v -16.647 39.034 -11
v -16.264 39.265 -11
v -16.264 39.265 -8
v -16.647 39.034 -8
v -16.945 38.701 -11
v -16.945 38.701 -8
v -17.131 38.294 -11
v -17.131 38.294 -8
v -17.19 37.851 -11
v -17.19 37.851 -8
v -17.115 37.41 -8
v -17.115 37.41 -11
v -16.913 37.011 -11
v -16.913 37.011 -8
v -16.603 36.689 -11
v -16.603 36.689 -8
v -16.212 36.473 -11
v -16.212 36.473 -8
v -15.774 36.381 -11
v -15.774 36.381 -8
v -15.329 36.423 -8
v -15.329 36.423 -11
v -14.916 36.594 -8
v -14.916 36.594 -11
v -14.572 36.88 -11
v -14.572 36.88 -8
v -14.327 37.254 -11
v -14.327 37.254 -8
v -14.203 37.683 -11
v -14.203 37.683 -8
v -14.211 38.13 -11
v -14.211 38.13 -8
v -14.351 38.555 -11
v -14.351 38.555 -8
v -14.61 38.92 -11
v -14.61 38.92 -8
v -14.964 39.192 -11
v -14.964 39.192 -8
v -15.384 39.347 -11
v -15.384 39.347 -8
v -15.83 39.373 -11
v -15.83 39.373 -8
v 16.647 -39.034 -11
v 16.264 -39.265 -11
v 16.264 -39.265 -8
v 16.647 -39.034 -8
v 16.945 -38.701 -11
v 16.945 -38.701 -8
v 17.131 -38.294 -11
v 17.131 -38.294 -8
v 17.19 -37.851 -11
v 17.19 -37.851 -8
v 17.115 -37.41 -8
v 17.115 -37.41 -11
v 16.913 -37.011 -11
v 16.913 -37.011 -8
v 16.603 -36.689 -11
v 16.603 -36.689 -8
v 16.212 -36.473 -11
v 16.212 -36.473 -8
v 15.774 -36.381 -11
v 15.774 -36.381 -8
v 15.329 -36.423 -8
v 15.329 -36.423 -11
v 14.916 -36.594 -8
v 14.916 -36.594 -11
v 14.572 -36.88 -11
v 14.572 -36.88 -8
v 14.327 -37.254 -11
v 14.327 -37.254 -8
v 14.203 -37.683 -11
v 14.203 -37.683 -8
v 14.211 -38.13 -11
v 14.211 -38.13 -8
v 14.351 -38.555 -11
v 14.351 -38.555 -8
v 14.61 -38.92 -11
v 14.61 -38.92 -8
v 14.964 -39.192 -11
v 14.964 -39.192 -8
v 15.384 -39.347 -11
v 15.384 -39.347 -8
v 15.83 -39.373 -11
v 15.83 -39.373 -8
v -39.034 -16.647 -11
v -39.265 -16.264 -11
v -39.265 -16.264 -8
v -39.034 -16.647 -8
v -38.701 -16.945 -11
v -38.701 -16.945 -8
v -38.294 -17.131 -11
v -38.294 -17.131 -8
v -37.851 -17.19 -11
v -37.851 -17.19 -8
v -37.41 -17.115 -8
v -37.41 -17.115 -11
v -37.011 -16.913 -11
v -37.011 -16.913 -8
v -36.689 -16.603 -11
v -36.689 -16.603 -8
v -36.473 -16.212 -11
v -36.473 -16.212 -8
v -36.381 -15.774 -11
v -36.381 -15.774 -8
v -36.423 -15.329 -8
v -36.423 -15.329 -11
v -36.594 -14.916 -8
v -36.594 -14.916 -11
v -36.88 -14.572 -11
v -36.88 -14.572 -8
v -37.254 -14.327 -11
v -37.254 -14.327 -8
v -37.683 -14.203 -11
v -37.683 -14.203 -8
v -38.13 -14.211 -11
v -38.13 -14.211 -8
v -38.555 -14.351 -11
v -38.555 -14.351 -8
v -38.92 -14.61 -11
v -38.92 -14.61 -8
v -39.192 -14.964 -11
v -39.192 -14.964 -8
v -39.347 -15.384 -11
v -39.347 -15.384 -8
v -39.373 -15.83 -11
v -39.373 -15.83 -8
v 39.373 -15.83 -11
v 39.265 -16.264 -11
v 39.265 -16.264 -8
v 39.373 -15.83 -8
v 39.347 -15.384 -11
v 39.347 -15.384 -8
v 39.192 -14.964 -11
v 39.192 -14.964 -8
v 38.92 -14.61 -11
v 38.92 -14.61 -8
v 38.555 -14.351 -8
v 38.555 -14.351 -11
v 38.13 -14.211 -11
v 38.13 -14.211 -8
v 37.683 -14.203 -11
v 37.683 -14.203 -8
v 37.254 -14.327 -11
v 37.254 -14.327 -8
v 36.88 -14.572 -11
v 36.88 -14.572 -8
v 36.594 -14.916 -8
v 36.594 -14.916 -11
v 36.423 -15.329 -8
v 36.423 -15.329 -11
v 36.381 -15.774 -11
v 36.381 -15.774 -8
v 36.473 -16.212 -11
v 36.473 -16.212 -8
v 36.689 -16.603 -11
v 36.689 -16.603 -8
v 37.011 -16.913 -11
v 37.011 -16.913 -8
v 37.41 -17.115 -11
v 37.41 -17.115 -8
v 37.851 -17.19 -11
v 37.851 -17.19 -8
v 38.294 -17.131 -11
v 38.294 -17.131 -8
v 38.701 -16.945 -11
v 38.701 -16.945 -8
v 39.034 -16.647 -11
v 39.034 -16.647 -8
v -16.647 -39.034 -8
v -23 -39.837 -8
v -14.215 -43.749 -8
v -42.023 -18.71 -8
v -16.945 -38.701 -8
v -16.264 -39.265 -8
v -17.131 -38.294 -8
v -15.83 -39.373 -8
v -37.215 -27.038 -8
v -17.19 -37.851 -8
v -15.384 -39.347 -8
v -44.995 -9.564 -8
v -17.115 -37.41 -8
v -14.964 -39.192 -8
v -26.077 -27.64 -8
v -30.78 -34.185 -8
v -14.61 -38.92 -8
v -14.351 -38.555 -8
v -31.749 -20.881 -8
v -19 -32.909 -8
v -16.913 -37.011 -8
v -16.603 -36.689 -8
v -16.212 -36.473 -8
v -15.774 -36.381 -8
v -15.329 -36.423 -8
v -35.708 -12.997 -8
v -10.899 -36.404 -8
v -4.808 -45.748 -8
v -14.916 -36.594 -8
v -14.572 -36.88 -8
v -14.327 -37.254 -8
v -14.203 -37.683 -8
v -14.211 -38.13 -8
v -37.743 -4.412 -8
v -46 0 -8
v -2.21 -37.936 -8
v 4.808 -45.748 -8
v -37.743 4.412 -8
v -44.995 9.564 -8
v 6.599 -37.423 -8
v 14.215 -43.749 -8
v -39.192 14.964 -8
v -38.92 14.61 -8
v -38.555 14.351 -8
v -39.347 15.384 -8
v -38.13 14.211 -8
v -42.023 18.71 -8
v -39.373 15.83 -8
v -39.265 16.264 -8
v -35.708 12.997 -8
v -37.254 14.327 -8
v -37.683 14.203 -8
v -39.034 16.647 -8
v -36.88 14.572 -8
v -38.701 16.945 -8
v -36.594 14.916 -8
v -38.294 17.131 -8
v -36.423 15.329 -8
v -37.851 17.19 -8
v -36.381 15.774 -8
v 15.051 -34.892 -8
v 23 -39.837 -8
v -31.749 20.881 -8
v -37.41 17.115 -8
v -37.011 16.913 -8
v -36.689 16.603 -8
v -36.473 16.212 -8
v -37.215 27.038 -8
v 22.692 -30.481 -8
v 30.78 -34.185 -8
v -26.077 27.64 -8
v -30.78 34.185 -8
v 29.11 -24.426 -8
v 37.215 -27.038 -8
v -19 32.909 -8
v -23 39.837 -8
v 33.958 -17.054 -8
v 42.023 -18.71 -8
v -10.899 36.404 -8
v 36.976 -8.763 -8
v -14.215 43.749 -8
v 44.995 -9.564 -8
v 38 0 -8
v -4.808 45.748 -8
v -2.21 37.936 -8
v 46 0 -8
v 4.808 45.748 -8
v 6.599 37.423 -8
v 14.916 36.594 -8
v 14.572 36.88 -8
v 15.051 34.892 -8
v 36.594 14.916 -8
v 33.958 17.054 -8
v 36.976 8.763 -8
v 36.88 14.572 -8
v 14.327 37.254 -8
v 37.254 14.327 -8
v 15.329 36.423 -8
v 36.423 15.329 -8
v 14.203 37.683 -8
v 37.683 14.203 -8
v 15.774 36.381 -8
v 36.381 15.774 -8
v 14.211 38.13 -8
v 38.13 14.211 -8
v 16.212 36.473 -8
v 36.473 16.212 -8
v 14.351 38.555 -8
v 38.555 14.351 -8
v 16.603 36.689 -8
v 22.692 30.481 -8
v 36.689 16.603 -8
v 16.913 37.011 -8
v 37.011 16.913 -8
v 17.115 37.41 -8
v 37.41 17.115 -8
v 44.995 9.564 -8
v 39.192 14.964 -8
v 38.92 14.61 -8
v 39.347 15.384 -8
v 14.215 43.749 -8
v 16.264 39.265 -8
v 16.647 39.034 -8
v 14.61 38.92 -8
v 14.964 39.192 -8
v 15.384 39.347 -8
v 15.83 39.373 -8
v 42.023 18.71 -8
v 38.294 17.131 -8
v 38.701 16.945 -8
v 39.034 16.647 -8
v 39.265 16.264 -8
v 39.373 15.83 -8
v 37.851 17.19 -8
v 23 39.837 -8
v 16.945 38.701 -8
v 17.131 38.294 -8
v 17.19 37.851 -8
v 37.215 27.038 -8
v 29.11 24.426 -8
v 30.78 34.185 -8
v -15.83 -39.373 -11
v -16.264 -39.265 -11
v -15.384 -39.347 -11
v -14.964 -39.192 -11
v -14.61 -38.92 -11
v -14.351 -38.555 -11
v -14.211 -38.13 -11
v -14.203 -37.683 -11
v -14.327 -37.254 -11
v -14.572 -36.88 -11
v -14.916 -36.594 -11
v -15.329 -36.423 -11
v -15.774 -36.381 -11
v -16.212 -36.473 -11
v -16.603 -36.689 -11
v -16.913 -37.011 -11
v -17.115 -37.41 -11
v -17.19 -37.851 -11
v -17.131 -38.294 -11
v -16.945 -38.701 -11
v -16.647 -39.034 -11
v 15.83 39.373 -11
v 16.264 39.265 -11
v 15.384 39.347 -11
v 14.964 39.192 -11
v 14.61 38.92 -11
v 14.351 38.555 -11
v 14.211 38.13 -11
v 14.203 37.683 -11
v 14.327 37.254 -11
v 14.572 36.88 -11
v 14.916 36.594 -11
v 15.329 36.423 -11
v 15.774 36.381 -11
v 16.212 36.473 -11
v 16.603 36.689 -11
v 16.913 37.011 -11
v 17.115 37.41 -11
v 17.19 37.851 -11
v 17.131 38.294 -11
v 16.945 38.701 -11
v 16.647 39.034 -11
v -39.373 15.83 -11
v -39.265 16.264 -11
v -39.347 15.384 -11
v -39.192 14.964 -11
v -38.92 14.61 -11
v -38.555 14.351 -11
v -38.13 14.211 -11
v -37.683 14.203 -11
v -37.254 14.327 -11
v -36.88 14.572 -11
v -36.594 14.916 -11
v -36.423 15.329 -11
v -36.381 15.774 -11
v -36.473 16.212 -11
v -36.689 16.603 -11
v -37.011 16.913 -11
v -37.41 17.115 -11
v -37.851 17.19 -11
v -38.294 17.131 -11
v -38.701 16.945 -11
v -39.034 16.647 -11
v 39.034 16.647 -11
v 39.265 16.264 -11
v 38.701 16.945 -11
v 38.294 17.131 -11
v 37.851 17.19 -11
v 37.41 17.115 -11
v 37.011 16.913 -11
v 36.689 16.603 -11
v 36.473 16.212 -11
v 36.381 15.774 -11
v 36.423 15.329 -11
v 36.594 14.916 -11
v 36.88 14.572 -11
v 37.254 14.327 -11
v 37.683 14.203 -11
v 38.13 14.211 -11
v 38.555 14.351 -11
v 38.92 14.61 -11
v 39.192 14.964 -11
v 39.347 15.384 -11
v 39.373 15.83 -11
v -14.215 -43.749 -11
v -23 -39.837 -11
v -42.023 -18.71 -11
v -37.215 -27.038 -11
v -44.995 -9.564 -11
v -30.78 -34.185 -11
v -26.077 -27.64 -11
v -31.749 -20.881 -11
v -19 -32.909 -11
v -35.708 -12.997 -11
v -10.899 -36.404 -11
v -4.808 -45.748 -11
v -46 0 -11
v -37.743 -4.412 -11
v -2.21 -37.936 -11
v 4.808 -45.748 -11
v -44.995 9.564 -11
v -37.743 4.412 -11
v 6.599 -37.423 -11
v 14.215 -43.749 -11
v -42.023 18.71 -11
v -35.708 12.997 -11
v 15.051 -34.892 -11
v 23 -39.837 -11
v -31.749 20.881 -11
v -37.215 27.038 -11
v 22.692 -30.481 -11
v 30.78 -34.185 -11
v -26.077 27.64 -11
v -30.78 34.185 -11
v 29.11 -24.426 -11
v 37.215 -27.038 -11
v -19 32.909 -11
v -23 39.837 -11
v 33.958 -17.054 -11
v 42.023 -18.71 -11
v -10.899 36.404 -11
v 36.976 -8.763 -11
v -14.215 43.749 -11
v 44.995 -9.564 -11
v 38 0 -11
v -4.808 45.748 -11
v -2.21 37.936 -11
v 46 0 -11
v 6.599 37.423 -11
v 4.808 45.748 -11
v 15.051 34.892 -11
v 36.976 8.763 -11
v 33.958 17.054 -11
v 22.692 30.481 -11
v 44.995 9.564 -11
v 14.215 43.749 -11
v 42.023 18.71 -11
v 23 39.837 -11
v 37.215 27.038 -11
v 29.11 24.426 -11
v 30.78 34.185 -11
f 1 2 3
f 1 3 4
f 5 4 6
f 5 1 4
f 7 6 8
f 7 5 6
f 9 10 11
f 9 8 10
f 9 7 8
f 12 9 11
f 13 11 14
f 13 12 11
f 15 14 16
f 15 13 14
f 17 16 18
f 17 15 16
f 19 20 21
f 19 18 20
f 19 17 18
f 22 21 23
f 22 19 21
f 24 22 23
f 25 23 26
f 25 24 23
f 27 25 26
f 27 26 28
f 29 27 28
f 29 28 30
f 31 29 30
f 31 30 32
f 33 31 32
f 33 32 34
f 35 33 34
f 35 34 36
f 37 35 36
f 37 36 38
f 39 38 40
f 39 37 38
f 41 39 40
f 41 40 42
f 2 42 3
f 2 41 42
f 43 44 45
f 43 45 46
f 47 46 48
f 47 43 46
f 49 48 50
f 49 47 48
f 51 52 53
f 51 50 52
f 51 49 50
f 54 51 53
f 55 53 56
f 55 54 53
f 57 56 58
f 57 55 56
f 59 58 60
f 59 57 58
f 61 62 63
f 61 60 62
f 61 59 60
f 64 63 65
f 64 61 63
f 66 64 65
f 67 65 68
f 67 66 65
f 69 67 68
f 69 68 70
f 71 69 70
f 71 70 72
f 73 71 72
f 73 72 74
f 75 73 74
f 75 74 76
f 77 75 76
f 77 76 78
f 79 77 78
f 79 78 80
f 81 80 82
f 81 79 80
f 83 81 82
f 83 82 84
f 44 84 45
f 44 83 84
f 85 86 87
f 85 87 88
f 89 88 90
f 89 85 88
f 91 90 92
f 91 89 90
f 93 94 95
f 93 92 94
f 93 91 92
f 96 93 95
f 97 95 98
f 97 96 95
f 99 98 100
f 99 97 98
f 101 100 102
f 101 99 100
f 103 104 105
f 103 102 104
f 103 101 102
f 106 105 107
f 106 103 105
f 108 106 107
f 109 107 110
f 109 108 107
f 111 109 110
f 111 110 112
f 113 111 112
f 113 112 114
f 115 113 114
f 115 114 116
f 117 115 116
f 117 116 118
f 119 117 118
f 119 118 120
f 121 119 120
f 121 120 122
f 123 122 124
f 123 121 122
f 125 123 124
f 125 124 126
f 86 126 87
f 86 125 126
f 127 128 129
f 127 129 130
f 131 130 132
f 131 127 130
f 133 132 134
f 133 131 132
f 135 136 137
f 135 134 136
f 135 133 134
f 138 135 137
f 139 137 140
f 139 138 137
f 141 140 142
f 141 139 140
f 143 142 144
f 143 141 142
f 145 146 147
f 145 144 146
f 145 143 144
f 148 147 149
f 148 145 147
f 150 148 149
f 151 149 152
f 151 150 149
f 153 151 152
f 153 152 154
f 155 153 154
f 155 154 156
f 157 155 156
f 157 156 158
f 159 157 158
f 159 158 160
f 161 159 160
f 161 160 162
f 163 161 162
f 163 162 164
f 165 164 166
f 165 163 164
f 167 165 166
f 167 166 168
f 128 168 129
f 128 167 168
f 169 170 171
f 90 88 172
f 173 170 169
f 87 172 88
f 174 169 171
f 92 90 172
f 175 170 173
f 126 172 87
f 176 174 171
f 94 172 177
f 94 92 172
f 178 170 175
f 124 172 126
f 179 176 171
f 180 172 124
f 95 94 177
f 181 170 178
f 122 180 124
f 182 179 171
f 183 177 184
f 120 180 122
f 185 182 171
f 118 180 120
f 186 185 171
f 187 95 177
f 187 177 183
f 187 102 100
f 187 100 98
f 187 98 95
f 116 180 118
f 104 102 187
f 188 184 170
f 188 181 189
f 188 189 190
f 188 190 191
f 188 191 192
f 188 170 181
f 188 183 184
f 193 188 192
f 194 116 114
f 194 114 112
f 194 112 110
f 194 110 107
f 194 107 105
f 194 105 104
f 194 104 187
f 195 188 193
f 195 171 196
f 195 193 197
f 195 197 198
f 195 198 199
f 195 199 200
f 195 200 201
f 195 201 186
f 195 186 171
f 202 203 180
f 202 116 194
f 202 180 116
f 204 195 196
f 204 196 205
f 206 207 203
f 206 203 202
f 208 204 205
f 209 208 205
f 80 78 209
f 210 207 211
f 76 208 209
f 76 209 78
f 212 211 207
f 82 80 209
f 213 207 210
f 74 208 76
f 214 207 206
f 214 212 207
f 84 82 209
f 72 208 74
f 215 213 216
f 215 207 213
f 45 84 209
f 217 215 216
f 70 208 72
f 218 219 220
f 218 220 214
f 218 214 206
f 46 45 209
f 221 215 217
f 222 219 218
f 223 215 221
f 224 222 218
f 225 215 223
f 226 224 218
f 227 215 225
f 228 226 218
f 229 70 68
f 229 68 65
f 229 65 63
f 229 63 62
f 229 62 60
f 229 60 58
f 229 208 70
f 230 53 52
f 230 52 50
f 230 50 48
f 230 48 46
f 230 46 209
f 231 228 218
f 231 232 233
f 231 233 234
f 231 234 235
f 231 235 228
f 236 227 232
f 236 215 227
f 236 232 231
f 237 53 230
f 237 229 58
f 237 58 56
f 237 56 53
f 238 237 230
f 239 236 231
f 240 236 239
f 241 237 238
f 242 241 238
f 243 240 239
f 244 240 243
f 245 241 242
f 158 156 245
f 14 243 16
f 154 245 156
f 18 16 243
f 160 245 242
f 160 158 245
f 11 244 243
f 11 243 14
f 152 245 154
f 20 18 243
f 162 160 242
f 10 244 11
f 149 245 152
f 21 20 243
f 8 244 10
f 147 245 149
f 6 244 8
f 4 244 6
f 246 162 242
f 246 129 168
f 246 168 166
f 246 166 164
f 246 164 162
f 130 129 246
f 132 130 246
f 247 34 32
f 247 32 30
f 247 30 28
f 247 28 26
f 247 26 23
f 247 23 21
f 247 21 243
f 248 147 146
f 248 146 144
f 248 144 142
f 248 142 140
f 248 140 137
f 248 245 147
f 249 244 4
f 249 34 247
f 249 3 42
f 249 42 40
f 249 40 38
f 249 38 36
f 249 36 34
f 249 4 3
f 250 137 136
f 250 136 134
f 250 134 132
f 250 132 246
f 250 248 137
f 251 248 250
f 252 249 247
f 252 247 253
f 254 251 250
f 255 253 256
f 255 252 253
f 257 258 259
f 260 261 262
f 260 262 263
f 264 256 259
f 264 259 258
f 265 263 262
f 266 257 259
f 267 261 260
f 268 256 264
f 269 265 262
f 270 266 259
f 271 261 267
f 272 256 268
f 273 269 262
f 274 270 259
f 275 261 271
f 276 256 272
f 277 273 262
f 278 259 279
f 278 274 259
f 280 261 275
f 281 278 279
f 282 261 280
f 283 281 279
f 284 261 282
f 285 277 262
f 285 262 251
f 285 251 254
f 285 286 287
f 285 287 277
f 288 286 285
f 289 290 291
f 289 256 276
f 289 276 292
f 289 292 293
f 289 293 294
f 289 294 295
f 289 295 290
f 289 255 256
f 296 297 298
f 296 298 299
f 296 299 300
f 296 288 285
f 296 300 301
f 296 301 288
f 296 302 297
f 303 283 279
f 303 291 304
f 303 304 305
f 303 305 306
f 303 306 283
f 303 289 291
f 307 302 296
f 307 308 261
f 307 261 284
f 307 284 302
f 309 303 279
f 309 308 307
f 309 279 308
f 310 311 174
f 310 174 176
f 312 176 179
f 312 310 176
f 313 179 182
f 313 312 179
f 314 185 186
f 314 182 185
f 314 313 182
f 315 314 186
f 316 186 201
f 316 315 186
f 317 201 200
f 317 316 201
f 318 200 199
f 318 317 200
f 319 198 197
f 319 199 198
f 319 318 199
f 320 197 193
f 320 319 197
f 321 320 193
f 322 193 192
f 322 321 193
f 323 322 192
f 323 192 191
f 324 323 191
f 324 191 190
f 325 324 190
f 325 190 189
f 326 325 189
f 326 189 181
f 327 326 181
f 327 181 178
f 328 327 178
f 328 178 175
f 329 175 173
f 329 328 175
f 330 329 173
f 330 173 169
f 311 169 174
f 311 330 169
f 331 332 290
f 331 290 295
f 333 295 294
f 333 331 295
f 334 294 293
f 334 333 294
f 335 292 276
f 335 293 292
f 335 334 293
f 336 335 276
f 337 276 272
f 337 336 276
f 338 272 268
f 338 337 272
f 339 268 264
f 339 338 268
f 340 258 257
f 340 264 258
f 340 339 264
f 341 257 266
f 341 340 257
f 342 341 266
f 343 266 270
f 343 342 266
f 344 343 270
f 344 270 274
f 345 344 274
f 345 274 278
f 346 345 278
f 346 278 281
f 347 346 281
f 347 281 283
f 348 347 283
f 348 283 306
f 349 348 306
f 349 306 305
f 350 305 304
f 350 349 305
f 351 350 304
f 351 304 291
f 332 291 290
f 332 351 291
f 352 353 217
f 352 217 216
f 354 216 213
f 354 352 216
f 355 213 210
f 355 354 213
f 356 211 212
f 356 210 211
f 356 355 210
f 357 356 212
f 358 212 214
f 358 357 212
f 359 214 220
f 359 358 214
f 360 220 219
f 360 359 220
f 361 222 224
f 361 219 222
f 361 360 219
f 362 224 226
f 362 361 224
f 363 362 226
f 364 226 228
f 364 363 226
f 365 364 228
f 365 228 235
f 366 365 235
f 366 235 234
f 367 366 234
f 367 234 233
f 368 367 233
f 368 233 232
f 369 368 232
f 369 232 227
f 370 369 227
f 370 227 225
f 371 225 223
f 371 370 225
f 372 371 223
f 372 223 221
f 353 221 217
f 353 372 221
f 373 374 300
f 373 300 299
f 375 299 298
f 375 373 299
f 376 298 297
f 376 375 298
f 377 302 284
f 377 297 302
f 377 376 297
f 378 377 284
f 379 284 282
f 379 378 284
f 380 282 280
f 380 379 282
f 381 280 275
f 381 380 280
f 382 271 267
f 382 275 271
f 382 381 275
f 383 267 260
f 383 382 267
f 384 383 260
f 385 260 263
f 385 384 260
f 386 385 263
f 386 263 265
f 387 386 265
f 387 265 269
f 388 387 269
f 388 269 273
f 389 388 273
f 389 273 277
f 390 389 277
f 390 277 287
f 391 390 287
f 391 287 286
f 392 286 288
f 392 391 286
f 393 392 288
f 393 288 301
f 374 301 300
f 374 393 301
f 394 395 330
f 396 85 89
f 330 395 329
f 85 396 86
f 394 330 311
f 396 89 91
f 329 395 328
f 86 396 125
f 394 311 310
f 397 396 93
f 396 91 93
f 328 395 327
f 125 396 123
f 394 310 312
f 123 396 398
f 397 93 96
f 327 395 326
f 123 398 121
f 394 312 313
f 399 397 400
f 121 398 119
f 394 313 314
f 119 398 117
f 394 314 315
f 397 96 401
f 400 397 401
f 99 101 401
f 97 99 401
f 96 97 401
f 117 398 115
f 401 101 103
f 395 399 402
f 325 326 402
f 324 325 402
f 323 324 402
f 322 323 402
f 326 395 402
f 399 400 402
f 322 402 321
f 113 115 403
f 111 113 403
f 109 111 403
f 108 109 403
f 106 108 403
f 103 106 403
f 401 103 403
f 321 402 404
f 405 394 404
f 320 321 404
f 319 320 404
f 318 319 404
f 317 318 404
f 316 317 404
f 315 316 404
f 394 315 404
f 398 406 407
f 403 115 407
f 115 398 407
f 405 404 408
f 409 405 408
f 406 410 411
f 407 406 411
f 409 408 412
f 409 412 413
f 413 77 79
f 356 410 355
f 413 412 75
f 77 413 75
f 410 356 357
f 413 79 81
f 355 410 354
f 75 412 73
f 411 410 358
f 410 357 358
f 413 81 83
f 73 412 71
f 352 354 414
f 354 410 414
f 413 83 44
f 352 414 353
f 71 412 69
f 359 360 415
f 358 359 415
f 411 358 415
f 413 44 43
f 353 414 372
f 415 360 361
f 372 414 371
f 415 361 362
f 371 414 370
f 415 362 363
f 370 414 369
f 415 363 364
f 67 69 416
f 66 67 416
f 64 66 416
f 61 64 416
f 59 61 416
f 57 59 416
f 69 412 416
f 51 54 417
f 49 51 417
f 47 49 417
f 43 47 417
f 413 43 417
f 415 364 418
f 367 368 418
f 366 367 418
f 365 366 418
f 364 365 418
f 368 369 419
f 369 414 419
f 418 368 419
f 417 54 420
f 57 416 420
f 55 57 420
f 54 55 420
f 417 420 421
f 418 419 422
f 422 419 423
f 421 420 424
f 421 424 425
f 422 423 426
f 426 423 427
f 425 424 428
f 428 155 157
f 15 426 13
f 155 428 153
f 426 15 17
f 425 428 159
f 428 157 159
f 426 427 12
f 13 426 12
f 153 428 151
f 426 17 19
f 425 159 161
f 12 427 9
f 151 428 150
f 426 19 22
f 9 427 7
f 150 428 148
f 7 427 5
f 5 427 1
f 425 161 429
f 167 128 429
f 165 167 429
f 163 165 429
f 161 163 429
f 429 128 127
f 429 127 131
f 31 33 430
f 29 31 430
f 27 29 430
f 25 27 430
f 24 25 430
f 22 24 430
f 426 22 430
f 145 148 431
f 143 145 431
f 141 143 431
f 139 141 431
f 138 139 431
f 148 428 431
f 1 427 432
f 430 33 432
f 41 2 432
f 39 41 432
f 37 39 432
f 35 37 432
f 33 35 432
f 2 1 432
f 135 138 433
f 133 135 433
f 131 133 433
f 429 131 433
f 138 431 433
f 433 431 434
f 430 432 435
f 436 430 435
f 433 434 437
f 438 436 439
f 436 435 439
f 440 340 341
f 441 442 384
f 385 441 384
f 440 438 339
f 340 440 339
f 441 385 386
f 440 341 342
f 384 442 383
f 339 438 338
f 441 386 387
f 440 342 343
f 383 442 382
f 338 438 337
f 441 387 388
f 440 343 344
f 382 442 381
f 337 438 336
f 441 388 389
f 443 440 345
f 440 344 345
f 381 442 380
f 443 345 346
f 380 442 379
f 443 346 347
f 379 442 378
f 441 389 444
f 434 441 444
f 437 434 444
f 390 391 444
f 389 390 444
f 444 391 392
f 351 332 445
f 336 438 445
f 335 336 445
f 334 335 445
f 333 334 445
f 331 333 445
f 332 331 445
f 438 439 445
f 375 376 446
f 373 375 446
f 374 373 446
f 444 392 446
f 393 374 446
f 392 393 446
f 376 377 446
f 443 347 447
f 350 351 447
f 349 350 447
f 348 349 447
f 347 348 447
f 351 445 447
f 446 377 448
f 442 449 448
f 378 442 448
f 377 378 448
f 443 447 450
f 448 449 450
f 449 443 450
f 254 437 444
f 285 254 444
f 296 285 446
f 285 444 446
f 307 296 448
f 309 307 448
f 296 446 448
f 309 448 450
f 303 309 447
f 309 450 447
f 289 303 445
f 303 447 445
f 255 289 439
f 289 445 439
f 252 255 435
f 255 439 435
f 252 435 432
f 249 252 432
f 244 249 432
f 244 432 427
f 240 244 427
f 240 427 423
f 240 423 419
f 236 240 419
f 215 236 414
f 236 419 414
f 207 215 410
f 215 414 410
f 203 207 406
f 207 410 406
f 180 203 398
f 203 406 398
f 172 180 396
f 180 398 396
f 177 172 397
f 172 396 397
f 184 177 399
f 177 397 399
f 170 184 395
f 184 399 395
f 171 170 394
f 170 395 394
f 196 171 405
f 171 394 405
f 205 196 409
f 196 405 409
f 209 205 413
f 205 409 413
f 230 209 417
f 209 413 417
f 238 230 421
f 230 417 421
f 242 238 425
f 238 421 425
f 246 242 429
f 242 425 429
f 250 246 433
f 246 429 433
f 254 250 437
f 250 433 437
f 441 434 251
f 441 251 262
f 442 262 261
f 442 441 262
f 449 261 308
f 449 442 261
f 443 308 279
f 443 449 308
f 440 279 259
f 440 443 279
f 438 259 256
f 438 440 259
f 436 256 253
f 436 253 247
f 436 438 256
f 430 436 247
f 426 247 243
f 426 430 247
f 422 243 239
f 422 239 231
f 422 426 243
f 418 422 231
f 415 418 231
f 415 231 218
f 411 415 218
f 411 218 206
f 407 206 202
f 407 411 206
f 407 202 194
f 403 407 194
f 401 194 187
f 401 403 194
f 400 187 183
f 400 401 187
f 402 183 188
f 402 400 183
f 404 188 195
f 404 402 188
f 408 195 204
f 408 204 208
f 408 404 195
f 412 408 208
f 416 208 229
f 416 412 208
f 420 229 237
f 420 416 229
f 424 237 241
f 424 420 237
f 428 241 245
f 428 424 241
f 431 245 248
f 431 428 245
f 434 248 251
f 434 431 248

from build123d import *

# Parameters (mm, degrees)
CYLINDER412_R               = 1.5
CYLINDER412_DEPTH           = 60
CYLINDER410_R               = 1.5
CYLINDER410_DEPTH           = 60
CYLINDER410_PLACEMENT_ANGLE = 135
CYLINDER408_R               = 1.5
CYLINDER408_DEPTH           = 60
CYLINDER411_R               = 1.5
CYLINDER411_DEPTH           = 60
CYLINDER411_PLACEMENT_ANGLE = 225
CYLINDER414_R               = 1.5
CYLINDER414_DEPTH           = 60
CYLINDER407_R               = 1.5
CYLINDER407_DEPTH           = 60
CYLINDER407_PLACEMENT_ANGLE = 45
CYLINDER413_R               = 1.5
CYLINDER413_DEPTH           = 60
CYLINDER409_R               = 1.5
CYLINDER409_DEPTH           = 60
CYLINDER409_PLACEMENT_ANGLE = 45
COMPOUND307_PLACEMENT_ANGLE = 22.5
TUBE036_R                   = 46
TUBE036_R_2                 = 38
TUBE036_DEPTH               = 3


with BuildPart() as v_lec412:
    # Cylinder412 → Cylinder412 (new body)
    with BuildSketch(Plane(origin=(0, 41, -54), x_dir=(0, 1, 0), z_dir=(0, 0, 1))):
        Circle(CYLINDER412_R)
    extrude(amount=CYLINDER412_DEPTH)


with BuildPart() as v_lec410:
    # Cylinder410 → Cylinder410 (new body)
    with BuildSketch(Plane.XY):
        Circle(CYLINDER410_R)
    extrude(amount=CYLINDER410_DEPTH)


with BuildPart() as v_lec410_1:
    # Cylinder410 placement: moved
    add(v_lec410.part.moved(Location((-28.991378, 28.991378, -54))).rotate(Axis((-28.991378, 28.991378, -54), (0, 0, 1)), CYLINDER410_PLACEMENT_ANGLE))


with BuildPart() as v_lec408:
    # Cylinder408 → Cylinder408 (new body)
    with BuildSketch(Plane(origin=(-41, 0, -54), x_dir=(-1, 0, 0), z_dir=(0, 0, 1))):
        Circle(CYLINDER408_R)
    extrude(amount=CYLINDER408_DEPTH)


with BuildPart() as v_lec411:
    # Cylinder411 → Cylinder411 (new body)
    with BuildSketch(Plane.XY):
        Circle(CYLINDER411_R)
    extrude(amount=CYLINDER411_DEPTH)


with BuildPart() as v_lec411_1:
    # Cylinder411 placement: moved
    add(v_lec411.part.moved(Location((-28.991378, -28.991378, -54))).rotate(Axis((-28.991378, -28.991378, -54), (0, 0, 1)), CYLINDER411_PLACEMENT_ANGLE))


with BuildPart() as v_lec414:
    # Cylinder414 → Cylinder414 (new body)
    with BuildSketch(Plane(origin=(0, -41, -54), x_dir=(0, -1, 0), z_dir=(0, 0, 1))):
        Circle(CYLINDER414_R)
    extrude(amount=CYLINDER414_DEPTH)


with BuildPart() as v_lec407:
    # Cylinder407 → Cylinder407 (new body)
    with BuildSketch(Plane.XY):
        Circle(CYLINDER407_R)
    extrude(amount=CYLINDER407_DEPTH)


with BuildPart() as v_lec407_1:
    # Cylinder407 placement: moved
    add(v_lec407.part.moved(Location((28.991378, -28.991378, -54))).rotate(Axis((28.991378, -28.991378, -54), (0, 0, -1)), CYLINDER407_PLACEMENT_ANGLE))


with BuildPart() as v_lec413:
    # Cylinder413 → Cylinder413 (new body)
    with BuildSketch(Plane(origin=(41, 0, -54), x_dir=(1, 0, 0), z_dir=(0, 0, 1))):
        Circle(CYLINDER413_R)
    extrude(amount=CYLINDER413_DEPTH)


with BuildPart() as compound307:
    # Cylinder409 → Cylinder409 (new body)
    with BuildSketch(Plane.XY):
        Circle(CYLINDER409_R)
    extrude(amount=CYLINDER409_DEPTH)


with BuildPart() as compound307_1:
    # Cylinder409 placement: moved
    add(compound307.part.moved(Location((28.991378, 28.991378, -54))).rotate(Axis((28.991378, 28.991378, -54), (0, 0, 1)), CYLINDER409_PLACEMENT_ANGLE))

    # Compound307: union Válec412, Válec410, Válec408, Válec411, Válec414, Válec407, Válec413
    add(v_lec412.part)
    add(v_lec410_1.part)
    add(v_lec408.part)
    add(v_lec411_1.part)
    add(v_lec414.part)
    add(v_lec407_1.part)
    add(v_lec413.part)


with BuildPart() as compound307_2:
    # Compound307 placement: moved
    add(compound307_1.part.rotate(Axis((0, 0, 0), (0, 0, 1)), COMPOUND307_PLACEMENT_ANGLE))


with BuildPart() as j_midi_motor_washer:
    # Tube036 → Tube036 (new body)
    with BuildSketch(Plane.XY.offset(-11)):
        Circle(TUBE036_R)
        Circle(TUBE036_R_2, mode=Mode.SUBTRACT)
    extrude(amount=TUBE036_DEPTH)

    # Cut162: cut Compound307
    add(compound307_2.part, mode=Mode.SUBTRACT)


solid = j_midi_motor_washer.part
